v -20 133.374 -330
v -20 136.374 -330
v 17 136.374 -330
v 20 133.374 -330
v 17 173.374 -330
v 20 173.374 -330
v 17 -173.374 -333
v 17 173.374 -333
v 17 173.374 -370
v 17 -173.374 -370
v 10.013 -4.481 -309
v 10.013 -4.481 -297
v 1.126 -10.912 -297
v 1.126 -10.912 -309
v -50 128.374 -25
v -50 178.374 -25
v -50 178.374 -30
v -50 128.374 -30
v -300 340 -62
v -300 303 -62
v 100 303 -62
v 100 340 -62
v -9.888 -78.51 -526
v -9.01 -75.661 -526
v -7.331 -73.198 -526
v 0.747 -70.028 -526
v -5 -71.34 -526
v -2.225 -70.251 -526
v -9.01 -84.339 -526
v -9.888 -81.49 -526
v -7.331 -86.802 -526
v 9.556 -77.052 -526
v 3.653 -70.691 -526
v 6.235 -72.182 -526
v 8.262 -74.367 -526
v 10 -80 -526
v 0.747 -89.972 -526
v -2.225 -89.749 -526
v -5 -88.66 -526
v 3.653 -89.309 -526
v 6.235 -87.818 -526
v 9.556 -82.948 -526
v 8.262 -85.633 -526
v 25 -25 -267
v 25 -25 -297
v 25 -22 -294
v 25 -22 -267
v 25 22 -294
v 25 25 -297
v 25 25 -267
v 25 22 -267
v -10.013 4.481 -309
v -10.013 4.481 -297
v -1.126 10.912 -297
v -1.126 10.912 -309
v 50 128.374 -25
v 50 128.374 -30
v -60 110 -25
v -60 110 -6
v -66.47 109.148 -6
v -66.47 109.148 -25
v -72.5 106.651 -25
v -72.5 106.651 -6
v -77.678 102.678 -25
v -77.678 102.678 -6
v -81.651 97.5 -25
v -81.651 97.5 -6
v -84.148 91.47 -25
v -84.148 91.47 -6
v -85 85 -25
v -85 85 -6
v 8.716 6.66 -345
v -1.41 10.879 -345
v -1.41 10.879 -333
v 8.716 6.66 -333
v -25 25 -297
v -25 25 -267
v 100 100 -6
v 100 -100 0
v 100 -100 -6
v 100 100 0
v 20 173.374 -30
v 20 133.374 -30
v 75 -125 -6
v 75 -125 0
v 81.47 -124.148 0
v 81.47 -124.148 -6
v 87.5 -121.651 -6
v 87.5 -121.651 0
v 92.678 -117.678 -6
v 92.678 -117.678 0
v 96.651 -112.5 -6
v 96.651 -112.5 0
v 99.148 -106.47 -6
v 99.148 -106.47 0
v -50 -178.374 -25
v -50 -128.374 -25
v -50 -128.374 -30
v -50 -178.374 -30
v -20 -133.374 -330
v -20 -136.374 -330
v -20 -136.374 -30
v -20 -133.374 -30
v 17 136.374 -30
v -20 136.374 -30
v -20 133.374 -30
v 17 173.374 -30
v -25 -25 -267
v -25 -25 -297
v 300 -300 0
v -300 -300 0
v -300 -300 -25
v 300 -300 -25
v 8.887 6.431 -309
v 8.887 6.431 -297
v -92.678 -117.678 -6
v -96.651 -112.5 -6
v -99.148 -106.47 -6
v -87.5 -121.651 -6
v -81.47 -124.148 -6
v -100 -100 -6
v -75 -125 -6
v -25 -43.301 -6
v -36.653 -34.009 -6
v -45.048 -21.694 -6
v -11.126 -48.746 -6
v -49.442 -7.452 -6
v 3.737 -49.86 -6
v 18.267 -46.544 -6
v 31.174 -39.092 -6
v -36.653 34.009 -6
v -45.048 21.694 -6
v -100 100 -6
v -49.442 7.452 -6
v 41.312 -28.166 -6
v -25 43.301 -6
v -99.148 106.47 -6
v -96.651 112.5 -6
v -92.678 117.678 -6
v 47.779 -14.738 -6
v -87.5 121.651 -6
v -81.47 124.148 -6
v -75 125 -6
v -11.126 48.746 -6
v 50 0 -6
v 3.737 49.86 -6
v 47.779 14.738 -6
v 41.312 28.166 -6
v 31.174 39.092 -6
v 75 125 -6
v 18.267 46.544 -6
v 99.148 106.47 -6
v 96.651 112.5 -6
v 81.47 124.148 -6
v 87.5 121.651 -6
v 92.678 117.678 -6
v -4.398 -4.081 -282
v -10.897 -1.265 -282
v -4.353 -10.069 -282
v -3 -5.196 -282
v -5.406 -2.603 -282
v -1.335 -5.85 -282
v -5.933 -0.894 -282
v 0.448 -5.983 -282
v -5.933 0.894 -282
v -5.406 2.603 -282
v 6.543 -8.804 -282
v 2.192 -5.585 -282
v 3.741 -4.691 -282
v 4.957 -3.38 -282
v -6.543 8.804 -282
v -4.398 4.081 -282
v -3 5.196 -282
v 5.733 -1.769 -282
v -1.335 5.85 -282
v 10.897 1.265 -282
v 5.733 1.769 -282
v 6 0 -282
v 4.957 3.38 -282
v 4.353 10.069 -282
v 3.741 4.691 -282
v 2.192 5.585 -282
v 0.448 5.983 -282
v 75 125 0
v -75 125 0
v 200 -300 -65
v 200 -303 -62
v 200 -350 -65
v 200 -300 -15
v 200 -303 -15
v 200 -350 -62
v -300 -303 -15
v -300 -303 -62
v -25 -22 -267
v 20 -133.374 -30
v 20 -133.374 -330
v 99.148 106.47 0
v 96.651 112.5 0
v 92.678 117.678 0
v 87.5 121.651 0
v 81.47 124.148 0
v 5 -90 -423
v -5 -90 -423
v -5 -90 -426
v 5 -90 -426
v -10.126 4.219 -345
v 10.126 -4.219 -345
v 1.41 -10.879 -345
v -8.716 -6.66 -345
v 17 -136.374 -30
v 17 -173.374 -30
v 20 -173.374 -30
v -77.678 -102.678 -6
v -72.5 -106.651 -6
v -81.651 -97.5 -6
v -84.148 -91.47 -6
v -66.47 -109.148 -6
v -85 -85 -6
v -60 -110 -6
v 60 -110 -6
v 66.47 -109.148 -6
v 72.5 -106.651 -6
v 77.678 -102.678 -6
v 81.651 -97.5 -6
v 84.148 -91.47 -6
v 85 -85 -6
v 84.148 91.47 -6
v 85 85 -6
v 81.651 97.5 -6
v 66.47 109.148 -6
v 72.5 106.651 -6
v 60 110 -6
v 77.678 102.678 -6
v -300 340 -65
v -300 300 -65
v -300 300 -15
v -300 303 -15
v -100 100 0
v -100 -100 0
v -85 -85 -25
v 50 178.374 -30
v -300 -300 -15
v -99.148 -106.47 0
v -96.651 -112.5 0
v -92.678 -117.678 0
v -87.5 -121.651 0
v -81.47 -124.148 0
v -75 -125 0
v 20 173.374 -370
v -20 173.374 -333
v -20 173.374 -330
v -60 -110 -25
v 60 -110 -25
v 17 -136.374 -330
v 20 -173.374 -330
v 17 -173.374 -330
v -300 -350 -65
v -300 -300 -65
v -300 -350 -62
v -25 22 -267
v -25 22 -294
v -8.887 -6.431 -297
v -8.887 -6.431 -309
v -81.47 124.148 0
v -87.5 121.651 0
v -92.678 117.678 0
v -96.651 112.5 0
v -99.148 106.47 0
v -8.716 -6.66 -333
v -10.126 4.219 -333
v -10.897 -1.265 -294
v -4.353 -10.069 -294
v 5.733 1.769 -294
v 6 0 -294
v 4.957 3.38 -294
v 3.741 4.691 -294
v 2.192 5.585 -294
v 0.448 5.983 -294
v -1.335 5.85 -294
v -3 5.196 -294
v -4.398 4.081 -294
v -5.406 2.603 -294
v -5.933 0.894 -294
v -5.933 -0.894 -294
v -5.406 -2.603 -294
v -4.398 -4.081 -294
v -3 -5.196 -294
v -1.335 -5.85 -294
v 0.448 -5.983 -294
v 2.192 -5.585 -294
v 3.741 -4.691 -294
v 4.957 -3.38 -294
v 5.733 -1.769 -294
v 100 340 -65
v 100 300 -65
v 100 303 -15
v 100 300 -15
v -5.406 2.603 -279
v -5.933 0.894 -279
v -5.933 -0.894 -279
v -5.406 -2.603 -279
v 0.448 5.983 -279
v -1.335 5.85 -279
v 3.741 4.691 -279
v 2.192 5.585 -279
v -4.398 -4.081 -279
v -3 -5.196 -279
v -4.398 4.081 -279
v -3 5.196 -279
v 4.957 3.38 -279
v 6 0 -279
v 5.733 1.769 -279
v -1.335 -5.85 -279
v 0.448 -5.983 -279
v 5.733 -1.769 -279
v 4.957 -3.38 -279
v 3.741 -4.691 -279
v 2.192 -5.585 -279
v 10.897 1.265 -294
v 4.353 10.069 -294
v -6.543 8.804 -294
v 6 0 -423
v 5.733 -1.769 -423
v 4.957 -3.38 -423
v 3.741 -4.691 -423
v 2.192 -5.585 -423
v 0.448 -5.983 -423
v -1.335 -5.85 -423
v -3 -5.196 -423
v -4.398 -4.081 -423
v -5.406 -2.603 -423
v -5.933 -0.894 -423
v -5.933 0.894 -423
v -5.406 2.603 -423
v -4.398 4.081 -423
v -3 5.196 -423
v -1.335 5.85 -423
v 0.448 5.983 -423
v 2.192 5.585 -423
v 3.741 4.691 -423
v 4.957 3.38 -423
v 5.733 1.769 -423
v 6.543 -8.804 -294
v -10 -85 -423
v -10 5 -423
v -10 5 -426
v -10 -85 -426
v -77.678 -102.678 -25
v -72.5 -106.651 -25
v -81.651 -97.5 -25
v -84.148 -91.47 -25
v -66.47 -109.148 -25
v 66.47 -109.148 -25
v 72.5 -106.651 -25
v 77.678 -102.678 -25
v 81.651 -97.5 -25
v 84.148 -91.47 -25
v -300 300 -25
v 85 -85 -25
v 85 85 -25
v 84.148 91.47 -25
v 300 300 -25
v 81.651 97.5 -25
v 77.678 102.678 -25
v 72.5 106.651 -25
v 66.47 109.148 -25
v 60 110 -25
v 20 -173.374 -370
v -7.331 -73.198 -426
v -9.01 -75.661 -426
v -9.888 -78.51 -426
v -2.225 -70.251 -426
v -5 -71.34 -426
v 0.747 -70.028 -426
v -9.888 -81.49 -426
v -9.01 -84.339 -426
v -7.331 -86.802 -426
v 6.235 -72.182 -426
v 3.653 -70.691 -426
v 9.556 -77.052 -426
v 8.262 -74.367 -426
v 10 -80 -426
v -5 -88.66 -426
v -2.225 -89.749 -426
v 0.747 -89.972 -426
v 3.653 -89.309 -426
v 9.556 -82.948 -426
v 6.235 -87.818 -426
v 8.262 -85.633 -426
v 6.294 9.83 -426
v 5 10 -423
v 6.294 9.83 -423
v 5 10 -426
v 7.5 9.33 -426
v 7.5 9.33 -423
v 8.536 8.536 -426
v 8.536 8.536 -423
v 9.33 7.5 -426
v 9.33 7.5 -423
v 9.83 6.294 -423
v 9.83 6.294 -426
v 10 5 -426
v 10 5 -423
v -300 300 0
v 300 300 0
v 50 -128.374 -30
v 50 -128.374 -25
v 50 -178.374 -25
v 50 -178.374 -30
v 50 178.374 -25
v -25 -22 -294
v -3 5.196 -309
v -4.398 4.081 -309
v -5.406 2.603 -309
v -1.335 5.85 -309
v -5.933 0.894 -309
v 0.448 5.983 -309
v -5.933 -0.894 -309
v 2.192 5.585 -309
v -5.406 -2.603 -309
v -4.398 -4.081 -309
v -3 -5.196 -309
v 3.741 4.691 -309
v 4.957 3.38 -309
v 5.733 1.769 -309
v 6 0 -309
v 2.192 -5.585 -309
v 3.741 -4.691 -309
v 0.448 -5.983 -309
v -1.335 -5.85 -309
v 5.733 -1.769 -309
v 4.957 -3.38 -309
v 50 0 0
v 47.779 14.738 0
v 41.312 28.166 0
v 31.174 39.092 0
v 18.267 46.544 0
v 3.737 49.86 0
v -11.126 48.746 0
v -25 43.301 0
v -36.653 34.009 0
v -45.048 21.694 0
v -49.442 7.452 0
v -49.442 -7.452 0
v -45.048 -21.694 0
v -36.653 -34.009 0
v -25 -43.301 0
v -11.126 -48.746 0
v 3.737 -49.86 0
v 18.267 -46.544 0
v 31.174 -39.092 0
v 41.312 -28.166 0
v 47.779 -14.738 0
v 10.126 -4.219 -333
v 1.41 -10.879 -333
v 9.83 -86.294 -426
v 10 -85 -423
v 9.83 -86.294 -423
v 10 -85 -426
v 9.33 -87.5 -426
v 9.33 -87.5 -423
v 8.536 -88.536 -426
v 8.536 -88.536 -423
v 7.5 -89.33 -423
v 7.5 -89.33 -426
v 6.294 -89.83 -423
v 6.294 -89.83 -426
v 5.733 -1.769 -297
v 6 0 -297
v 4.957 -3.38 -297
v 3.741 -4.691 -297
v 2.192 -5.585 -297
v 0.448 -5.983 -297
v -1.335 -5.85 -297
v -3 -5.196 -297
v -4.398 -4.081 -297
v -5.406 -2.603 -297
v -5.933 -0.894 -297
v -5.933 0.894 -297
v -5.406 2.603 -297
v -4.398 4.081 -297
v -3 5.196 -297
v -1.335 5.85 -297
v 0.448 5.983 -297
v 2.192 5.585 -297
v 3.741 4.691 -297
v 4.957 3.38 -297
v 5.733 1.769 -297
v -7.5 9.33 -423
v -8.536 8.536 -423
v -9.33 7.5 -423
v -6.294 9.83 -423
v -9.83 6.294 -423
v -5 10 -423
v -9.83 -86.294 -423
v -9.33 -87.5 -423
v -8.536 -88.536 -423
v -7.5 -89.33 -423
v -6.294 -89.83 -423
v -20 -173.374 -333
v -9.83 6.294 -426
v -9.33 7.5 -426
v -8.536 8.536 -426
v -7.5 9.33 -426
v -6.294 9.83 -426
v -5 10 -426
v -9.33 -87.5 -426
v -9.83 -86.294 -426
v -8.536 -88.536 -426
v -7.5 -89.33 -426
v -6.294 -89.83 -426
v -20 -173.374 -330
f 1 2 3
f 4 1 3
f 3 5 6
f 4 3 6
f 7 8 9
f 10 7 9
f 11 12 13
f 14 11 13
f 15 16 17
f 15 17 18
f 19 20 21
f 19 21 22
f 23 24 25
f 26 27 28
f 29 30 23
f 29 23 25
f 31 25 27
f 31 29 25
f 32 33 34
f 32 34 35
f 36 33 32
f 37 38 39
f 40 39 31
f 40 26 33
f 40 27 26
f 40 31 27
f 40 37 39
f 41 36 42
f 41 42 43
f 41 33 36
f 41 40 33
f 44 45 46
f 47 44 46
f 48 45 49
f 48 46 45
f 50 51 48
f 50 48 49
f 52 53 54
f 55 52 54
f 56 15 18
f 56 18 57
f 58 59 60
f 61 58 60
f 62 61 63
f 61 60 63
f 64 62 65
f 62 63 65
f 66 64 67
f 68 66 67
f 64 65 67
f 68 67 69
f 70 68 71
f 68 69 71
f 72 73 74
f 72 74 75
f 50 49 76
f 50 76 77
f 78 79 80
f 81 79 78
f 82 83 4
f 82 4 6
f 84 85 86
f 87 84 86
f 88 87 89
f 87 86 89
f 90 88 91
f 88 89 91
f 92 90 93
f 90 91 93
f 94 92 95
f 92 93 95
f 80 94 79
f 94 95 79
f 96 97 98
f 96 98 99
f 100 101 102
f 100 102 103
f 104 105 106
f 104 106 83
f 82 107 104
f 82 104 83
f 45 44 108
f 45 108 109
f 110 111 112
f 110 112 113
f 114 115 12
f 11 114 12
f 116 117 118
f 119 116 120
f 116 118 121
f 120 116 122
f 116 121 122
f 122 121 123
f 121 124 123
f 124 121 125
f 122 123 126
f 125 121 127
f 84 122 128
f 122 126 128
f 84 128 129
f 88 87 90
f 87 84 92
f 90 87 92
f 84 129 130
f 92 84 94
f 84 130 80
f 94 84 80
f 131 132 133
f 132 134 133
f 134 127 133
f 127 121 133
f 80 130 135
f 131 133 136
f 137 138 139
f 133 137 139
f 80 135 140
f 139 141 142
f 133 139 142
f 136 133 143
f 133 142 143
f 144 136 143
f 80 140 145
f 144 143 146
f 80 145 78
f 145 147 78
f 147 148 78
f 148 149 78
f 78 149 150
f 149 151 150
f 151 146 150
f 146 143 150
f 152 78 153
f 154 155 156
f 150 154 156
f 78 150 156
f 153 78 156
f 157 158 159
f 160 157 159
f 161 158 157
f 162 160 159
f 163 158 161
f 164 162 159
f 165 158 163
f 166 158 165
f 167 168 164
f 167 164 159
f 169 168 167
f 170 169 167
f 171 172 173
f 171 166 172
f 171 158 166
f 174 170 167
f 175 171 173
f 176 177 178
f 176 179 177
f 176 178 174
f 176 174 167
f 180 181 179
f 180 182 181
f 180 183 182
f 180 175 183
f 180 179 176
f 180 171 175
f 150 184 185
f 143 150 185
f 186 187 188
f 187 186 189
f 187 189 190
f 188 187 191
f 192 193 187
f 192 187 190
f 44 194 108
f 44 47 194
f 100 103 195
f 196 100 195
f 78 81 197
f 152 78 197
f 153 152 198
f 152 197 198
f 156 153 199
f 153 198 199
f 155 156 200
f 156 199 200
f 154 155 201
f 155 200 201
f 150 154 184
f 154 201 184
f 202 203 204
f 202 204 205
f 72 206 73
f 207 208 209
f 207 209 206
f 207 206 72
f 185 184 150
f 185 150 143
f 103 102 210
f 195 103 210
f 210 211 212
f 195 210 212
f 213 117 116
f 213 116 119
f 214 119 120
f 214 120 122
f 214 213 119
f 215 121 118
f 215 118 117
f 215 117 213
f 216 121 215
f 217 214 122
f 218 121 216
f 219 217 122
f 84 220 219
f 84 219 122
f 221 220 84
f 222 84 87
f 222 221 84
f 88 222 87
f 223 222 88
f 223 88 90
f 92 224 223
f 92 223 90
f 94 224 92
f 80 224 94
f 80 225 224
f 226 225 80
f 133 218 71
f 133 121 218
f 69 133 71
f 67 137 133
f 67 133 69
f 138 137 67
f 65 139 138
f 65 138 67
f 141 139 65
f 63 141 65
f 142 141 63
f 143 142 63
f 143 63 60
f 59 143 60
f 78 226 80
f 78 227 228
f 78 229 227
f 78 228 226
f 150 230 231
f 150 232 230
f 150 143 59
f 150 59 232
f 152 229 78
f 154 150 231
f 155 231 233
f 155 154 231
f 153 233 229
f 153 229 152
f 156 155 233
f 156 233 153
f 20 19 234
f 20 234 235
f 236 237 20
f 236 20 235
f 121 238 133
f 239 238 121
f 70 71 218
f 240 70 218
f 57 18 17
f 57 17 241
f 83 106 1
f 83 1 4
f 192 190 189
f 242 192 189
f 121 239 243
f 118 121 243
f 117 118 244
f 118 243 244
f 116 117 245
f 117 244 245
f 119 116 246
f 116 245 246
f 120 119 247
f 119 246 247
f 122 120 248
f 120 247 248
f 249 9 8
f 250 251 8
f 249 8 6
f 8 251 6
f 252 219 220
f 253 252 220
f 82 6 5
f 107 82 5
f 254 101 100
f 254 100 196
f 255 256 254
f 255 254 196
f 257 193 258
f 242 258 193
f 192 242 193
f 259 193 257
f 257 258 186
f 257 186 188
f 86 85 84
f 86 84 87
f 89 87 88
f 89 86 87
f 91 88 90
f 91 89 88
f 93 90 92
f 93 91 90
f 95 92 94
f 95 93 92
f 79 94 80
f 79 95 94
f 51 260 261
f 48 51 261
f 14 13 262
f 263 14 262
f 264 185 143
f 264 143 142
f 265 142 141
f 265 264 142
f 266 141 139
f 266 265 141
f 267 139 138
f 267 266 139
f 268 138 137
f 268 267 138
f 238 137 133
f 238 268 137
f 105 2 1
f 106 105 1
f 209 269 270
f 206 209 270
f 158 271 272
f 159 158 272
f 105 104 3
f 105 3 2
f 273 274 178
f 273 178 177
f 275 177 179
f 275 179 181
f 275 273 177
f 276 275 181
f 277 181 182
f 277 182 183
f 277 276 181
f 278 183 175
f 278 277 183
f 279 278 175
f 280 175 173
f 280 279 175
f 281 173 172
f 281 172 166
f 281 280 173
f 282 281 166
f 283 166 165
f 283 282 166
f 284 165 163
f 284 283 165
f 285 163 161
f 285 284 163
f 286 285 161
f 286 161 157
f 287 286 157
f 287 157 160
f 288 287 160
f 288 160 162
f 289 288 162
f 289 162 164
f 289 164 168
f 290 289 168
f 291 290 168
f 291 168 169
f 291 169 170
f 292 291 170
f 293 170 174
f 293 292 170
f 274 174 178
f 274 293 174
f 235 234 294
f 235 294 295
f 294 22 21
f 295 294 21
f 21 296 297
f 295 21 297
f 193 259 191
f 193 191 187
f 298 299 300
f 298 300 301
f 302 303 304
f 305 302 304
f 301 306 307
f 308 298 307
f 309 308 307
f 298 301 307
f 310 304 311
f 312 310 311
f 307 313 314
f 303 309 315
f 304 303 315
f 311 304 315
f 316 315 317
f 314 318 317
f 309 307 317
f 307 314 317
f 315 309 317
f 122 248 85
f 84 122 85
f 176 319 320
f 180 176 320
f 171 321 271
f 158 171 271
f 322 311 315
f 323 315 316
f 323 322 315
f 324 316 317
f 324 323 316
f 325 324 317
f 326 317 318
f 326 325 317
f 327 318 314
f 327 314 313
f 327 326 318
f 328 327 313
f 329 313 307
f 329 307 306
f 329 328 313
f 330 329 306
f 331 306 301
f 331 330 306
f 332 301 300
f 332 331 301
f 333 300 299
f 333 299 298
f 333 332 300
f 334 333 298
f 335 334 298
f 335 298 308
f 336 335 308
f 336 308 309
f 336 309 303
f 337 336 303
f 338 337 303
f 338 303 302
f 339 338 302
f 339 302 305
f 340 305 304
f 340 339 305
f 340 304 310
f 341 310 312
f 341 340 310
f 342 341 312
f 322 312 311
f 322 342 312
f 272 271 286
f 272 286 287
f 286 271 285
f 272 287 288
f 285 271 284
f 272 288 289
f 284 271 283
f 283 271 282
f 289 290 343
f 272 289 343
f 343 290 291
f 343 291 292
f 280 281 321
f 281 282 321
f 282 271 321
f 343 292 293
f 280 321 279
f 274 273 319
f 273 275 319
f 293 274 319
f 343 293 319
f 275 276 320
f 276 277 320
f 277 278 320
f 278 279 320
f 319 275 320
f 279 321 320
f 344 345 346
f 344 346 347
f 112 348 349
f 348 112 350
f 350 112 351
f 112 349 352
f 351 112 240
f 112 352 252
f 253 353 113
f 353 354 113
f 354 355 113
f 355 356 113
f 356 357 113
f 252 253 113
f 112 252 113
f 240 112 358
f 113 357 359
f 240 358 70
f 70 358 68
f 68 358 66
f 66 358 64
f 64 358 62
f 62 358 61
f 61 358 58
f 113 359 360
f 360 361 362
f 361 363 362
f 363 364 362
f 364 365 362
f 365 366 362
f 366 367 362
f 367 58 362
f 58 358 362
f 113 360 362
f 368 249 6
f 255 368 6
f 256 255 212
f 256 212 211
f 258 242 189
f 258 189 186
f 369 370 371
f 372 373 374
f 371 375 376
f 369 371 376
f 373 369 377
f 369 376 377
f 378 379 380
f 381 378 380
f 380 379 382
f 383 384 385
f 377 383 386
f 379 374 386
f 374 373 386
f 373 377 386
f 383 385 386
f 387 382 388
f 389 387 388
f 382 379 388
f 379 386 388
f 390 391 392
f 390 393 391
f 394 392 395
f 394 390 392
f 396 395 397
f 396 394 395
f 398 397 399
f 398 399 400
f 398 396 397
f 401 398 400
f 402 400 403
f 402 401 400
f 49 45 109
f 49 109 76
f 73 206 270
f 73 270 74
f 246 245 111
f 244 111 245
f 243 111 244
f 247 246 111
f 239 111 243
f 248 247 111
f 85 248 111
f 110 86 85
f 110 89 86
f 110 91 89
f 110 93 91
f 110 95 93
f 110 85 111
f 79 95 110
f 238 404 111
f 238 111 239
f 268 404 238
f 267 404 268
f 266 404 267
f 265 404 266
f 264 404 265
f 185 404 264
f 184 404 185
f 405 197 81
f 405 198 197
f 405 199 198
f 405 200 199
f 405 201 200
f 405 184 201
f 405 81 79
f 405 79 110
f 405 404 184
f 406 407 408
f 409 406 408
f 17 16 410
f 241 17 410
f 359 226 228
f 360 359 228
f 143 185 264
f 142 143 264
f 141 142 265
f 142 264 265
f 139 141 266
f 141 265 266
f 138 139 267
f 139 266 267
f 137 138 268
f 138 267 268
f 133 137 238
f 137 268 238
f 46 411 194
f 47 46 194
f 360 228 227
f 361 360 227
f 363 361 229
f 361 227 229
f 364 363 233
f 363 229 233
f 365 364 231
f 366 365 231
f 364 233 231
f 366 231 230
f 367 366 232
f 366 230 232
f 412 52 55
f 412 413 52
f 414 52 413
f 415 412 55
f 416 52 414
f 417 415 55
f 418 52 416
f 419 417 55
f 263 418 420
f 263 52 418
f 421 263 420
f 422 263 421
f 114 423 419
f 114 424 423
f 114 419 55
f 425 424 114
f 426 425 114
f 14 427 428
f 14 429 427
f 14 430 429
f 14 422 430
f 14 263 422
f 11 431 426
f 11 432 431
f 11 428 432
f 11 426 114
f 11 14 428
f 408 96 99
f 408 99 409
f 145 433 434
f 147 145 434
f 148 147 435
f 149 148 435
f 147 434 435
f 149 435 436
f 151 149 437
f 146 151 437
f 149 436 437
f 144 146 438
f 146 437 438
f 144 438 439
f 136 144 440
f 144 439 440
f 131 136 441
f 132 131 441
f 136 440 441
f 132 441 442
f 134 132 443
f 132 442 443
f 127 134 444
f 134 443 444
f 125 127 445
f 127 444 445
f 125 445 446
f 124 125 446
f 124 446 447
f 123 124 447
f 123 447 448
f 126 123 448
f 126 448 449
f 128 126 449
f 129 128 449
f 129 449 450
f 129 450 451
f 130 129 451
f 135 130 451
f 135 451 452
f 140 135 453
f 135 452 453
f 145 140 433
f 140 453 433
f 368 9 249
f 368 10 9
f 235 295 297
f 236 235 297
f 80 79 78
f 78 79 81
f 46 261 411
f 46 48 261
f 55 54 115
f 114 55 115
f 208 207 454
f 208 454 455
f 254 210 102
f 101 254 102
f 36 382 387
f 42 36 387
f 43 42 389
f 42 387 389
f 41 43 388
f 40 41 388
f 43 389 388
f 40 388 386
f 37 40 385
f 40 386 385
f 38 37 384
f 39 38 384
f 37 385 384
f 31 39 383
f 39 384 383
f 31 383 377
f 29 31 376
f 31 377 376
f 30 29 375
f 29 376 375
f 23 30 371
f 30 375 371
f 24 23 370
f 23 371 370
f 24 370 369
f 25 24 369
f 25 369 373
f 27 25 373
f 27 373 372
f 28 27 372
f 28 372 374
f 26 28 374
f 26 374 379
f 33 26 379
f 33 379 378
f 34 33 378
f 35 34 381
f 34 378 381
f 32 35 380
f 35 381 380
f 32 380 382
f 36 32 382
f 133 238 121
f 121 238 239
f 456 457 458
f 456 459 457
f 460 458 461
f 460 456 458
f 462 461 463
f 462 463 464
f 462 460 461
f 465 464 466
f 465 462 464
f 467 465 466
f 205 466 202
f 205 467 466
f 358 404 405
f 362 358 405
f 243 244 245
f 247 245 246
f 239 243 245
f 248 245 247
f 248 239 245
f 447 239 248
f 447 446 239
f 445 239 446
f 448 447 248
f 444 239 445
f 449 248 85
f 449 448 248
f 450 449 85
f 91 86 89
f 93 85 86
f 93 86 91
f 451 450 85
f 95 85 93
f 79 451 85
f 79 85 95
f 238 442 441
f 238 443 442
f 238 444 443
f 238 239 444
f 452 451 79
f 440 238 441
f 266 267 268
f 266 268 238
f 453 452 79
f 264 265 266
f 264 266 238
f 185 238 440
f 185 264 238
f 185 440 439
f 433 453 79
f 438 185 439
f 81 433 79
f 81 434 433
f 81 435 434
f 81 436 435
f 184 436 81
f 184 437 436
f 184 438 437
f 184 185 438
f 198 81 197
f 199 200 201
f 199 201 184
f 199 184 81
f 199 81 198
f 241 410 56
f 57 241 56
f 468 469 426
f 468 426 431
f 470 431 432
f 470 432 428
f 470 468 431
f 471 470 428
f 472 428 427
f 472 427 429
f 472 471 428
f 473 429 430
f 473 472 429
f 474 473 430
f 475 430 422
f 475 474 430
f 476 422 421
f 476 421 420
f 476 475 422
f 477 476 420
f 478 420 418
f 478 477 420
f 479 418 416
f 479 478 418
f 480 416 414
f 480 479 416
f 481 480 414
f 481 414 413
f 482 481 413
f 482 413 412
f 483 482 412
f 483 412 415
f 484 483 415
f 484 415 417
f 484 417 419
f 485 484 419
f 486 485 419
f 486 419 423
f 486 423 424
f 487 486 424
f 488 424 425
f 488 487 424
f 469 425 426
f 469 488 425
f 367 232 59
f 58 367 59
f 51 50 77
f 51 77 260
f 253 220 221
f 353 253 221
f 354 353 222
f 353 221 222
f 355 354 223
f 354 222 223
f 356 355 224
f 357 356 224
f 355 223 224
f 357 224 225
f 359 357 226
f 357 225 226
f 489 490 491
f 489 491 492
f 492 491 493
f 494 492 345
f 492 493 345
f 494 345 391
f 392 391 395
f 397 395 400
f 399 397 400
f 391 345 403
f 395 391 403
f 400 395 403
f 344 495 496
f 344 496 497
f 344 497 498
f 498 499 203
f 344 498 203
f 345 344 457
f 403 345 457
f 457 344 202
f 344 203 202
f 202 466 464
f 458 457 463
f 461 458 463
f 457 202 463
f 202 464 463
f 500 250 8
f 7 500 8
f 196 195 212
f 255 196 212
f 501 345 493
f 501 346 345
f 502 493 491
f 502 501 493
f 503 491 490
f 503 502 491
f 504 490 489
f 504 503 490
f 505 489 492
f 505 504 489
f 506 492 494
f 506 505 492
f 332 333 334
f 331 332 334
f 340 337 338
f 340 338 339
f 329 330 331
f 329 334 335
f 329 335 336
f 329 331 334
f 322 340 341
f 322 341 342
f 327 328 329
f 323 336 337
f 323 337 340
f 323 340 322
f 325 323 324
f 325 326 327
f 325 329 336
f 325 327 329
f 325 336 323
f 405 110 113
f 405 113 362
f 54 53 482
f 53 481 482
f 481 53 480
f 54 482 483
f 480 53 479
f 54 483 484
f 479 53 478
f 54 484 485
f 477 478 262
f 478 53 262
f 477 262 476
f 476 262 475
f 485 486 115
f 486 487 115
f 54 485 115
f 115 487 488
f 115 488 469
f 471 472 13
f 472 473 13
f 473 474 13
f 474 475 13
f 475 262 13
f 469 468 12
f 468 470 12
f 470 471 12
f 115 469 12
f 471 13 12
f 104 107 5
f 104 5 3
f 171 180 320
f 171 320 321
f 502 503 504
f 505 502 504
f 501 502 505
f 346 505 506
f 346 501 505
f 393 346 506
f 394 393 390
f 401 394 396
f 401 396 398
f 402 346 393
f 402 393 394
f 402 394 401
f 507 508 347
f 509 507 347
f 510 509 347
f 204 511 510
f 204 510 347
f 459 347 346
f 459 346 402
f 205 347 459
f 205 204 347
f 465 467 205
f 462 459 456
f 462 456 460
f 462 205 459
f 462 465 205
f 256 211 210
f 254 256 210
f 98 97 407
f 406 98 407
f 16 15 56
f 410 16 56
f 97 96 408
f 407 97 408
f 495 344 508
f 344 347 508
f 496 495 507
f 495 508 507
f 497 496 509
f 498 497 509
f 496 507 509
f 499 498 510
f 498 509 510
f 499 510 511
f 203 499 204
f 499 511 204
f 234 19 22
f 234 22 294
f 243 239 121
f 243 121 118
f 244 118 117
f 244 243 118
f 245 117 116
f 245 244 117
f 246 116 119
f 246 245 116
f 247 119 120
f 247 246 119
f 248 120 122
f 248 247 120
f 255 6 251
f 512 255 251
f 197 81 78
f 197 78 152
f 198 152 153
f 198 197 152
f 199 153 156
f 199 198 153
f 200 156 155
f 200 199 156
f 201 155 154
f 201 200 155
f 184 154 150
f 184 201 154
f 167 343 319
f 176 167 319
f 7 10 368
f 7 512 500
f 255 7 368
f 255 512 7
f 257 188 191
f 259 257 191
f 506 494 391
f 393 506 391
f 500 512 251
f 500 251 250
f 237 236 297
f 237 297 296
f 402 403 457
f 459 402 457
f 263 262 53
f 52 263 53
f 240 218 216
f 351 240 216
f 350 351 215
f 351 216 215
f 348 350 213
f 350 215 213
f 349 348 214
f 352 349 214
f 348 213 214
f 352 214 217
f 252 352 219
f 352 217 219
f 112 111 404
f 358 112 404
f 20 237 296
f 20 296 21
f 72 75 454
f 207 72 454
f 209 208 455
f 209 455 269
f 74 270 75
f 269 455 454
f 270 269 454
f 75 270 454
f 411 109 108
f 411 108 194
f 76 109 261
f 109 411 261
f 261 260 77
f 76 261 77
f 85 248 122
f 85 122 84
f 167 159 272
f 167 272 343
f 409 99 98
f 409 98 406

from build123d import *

# Parameters (mm, degrees)
F0_W           = 600
F0_H           = 600
F1_DEPTH       = 25
F3_DEPTH       = 500
F5_DEPTH       = 400
F6_R           = 50
F7_DEPTH       = 6
F10_DEPTH      = 65.001
F11_W          = 100
F11_H          = 50
F12_DEPTH      = 5
F14_DEPTH      = 300
F17_DEPTH      = 37
F17_DEPTH_BACK = 309.7471036047
F19_DEPTH      = 12
F20_R          = 6
F21_DEPTH      = 78
F21_DEPTH_BACK = 66
F22_W          = 20
F22_H          = 100
F23_DEPTH      = 3
F24_R          = 5
F25_R          = 10
F26_DEPTH      = 100
F28_DEPTH      = 25
F29_R          = 6
F30_DEPTH      = 12
F31_R          = 6
F32_DEPTH      = 12


with BuildPart() as f1:
    # F0 (on Top) → F1 (new body)
    with BuildSketch(Plane.XY):
        Rectangle(F0_W, F0_H)
    extrude(amount=-F1_DEPTH)


with BuildPart() as f3:
    # F2 (on face) → F3 (new body)
    with BuildSketch(Plane(origin=(-300, 0, 0), x_dir=(0, -1, 0), z_dir=(-1, 0, 0))):
        Polygon((303, -15), (300, -15), (300, -65), (350, -65), (350, -62), (303, -62), align=None)
    extrude(amount=-F3_DEPTH)


with BuildPart() as f5:
    # F4 (on face) → F5 (new body)
    with BuildSketch(Plane(origin=(-300, 0, 0), x_dir=(0, -1, 0), z_dir=(-1, 0, 0))):
        Polygon((-300, -65), (-300, -15), (-303, -15), (-303, -62), (-340, -62), (-340, -65), align=None)
    extrude(amount=-F5_DEPTH)


with BuildPart() as f7:
    # F6 (on face) → F7 (new body)
    with BuildSketch(Plane.XY):
        with BuildLine():
            ThreePointArc((100, 100), (92.6776695297, 117.6776695297), (75, 125))
            Line((75, 125), (-75, 125))
            ThreePointArc((-75, 125), (-92.6776695297, 117.6776695297), (-100, 100))
            Line((-100, 100), (-100, -100))
            ThreePointArc((-100, -100), (-92.6776695297, -117.6776695297), (-75, -125))
            Line((-75, -125), (75, -125))
            ThreePointArc((75, -125), (92.6776695297, -117.6776695297), (100, -100))
            Line((100, -100), (100, 100))
        make_face()
        Circle(F6_R, mode=Mode.SUBTRACT)
    extrude(amount=-F7_DEPTH)


with BuildPart() as f1_1:
    add(f1.part)

    # F8: cut F7
    add(f7.part, mode=Mode.SUBTRACT)

    # F9 (on face) → F10 (cut, through all)
    with BuildSketch(Plane.XY):
        with BuildLine():
            ThreePointArc((85, 85), (77.6776695297, 102.6776695297), (60, 110))
            Line((60, 110), (-60, 110))
            ThreePointArc((-60, 110), (-77.6776695297, 102.6776695297), (-85, 85))
            Line((-85, 85), (-85, -85))
            ThreePointArc((-85, -85), (-77.6776695297, -102.6776695297), (-60, -110))
            Line((-60, -110), (60, -110))
            ThreePointArc((60, -110), (77.6776695297, -102.6776695297), (85, -85))
            Line((85, -85), (85, 85))
        make_face()
    extrude(amount=-F10_DEPTH, mode=Mode.SUBTRACT)


with BuildPart() as f12:
    # F11 (on face) → F12 (new body)
    with BuildSketch(Plane(origin=(0, 0, -25), x_dir=(1, 0, 0), z_dir=(0, 0, -1))):
        with Locations((0, 153.3735518024)):
            Rectangle(F11_W, F11_H)
    extrude(amount=F12_DEPTH)


with BuildPart() as f12b:
    # F11 (on face) → F12, piece 2 (new body)
    with BuildSketch(Plane(origin=(0, 0, -25), x_dir=(1, 0, 0), z_dir=(0, 0, -1))):
        with Locations((0, -153.3735518024)):
            Rectangle(F11_W, F11_H)
    extrude(amount=F12_DEPTH)


with BuildPart() as f14:
    # F13 (on face) → F14 (new body)
    with BuildSketch(Plane(origin=(0, 0, -30), x_dir=(1, 0, 0), z_dir=(0, 0, -1))):
        Polygon((20, 133.3735518024), (20, 173.3735518024), (17, 173.3735518024), (17, 136.3735518024), (-20, 136.3735518024), (-20, 133.3735518024), align=None)
    extrude(amount=F14_DEPTH)


with BuildPart() as f15_1:
    # F15: instance of F14
    add(f14.part.mirror(Plane.XZ))


with BuildPart() as f17:
    # F16 (on face) → F17 (new body, two sides)
    with BuildSketch(Plane.XZ.offset(136.3735518024)) as f17_sk:
        Polygon((17, -370), (20, -370), (20, -330), (-20, -330), (-20, -333), (17, -333), align=None)
    extrude(amount=F17_DEPTH)
    extrude(f17_sk.sketch, amount=-F17_DEPTH_BACK)


with BuildPart() as f19:
    # F18 (on face) → F19 (new body)
    with BuildSketch(Plane(origin=(0, 0, -333), x_dir=(1, 0, 0), z_dir=(0, 0, -1))):
        Polygon((-10.1260223218, -4.2186496976), (-1.4095533531, -10.8787174188), (8.7164689687, -6.6600677212), (10.1260223218, 4.2186496976), (1.4095533531, 10.8787174188), (-8.7164689687, 6.6600677212), align=None)
    extrude(amount=F19_DEPTH)


with BuildPart() as f21:
    # F20 (on face) → F21 (new body, two sides)
    with BuildSketch(Plane(origin=(0, 0, -345), x_dir=(1, 0, 0), z_dir=(0, 0, -1))) as f21_sk:
        Circle(F20_R)
    extrude(amount=F21_DEPTH)
    extrude(f21_sk.sketch, amount=-F21_DEPTH_BACK)


with BuildPart() as f23:
    # F22 (on face) → F23 (new body)
    with BuildSketch(Plane(origin=(0, 0, -423), x_dir=(1, 0, 0), z_dir=(0, 0, -1))):
        with Locations((0, 40)):
            Rectangle(F22_W, F22_H)
    extrude(amount=F23_DEPTH)

    # F24
    f24_edges = [f23.edges().sort_by_distance(p)[0] for p in [
        (-10, -90, -424.5),
        (10, -90, -424.5),
        (10, 10, -424.5),
        (-10, 10, -424.5),
    ]]
    fillet(f24_edges, radius=F24_R)


with BuildPart() as f26:
    # F25 (on face) → F26 (new body)
    with BuildSketch(Plane(origin=(0, 0, -426), x_dir=(1, 0, 0), z_dir=(0, 0, -1))):
        with Locations((0, 80)):
            Circle(F25_R)
    extrude(amount=F26_DEPTH)


with BuildPart() as f28:
    # F27 (on Right) → F28 (new body, symmetric)
    with BuildSketch(Plane.YZ):
        Polygon((-22, -267), (-25, -267), (-25, -297), (25, -297), (25, -267), (22, -267), (22, -294), (-22, -294), align=None)
    extrude(amount=F28_DEPTH, both=True)


with BuildPart() as f30:
    # F29 (on face) → F30 (new body)
    with BuildSketch(Plane.XY.offset(-294)):
        Polygon((10.8965147313, 1.2646343518), (4.3530518905, 10.0689757459), (-6.5434628408, 8.8043413941), (-10.8965147313, -1.2646343518), (-4.3530518905, -10.0689757459), (6.5434628408, -8.8043413941), align=None)
        Circle(F29_R, mode=Mode.SUBTRACT)
    extrude(amount=F30_DEPTH)


with BuildPart() as f32:
    # F31 (on face) → F32 (new body)
    with BuildSketch(Plane(origin=(0, 0, -297), x_dir=(1, 0, 0), z_dir=(0, 0, -1))):
        Polygon((-10.0127647663, -4.4808341934), (-1.1258661415, -10.9117257464), (8.8868986248, -6.430891553), (10.0127647663, 4.4808341934), (1.1258661415, 10.9117257464), (-8.8868986248, 6.430891553), align=None)
        Circle(F31_R, mode=Mode.SUBTRACT)
    extrude(amount=F32_DEPTH)


solid = Compound([f3.part, f5.part, f7.part, f1_1.part, f12.part, f12b.part, f14.part, f15_1.part, f17.part, f19.part, f21.part, f23.part, f26.part, f28.part, f30.part, f32.part])
